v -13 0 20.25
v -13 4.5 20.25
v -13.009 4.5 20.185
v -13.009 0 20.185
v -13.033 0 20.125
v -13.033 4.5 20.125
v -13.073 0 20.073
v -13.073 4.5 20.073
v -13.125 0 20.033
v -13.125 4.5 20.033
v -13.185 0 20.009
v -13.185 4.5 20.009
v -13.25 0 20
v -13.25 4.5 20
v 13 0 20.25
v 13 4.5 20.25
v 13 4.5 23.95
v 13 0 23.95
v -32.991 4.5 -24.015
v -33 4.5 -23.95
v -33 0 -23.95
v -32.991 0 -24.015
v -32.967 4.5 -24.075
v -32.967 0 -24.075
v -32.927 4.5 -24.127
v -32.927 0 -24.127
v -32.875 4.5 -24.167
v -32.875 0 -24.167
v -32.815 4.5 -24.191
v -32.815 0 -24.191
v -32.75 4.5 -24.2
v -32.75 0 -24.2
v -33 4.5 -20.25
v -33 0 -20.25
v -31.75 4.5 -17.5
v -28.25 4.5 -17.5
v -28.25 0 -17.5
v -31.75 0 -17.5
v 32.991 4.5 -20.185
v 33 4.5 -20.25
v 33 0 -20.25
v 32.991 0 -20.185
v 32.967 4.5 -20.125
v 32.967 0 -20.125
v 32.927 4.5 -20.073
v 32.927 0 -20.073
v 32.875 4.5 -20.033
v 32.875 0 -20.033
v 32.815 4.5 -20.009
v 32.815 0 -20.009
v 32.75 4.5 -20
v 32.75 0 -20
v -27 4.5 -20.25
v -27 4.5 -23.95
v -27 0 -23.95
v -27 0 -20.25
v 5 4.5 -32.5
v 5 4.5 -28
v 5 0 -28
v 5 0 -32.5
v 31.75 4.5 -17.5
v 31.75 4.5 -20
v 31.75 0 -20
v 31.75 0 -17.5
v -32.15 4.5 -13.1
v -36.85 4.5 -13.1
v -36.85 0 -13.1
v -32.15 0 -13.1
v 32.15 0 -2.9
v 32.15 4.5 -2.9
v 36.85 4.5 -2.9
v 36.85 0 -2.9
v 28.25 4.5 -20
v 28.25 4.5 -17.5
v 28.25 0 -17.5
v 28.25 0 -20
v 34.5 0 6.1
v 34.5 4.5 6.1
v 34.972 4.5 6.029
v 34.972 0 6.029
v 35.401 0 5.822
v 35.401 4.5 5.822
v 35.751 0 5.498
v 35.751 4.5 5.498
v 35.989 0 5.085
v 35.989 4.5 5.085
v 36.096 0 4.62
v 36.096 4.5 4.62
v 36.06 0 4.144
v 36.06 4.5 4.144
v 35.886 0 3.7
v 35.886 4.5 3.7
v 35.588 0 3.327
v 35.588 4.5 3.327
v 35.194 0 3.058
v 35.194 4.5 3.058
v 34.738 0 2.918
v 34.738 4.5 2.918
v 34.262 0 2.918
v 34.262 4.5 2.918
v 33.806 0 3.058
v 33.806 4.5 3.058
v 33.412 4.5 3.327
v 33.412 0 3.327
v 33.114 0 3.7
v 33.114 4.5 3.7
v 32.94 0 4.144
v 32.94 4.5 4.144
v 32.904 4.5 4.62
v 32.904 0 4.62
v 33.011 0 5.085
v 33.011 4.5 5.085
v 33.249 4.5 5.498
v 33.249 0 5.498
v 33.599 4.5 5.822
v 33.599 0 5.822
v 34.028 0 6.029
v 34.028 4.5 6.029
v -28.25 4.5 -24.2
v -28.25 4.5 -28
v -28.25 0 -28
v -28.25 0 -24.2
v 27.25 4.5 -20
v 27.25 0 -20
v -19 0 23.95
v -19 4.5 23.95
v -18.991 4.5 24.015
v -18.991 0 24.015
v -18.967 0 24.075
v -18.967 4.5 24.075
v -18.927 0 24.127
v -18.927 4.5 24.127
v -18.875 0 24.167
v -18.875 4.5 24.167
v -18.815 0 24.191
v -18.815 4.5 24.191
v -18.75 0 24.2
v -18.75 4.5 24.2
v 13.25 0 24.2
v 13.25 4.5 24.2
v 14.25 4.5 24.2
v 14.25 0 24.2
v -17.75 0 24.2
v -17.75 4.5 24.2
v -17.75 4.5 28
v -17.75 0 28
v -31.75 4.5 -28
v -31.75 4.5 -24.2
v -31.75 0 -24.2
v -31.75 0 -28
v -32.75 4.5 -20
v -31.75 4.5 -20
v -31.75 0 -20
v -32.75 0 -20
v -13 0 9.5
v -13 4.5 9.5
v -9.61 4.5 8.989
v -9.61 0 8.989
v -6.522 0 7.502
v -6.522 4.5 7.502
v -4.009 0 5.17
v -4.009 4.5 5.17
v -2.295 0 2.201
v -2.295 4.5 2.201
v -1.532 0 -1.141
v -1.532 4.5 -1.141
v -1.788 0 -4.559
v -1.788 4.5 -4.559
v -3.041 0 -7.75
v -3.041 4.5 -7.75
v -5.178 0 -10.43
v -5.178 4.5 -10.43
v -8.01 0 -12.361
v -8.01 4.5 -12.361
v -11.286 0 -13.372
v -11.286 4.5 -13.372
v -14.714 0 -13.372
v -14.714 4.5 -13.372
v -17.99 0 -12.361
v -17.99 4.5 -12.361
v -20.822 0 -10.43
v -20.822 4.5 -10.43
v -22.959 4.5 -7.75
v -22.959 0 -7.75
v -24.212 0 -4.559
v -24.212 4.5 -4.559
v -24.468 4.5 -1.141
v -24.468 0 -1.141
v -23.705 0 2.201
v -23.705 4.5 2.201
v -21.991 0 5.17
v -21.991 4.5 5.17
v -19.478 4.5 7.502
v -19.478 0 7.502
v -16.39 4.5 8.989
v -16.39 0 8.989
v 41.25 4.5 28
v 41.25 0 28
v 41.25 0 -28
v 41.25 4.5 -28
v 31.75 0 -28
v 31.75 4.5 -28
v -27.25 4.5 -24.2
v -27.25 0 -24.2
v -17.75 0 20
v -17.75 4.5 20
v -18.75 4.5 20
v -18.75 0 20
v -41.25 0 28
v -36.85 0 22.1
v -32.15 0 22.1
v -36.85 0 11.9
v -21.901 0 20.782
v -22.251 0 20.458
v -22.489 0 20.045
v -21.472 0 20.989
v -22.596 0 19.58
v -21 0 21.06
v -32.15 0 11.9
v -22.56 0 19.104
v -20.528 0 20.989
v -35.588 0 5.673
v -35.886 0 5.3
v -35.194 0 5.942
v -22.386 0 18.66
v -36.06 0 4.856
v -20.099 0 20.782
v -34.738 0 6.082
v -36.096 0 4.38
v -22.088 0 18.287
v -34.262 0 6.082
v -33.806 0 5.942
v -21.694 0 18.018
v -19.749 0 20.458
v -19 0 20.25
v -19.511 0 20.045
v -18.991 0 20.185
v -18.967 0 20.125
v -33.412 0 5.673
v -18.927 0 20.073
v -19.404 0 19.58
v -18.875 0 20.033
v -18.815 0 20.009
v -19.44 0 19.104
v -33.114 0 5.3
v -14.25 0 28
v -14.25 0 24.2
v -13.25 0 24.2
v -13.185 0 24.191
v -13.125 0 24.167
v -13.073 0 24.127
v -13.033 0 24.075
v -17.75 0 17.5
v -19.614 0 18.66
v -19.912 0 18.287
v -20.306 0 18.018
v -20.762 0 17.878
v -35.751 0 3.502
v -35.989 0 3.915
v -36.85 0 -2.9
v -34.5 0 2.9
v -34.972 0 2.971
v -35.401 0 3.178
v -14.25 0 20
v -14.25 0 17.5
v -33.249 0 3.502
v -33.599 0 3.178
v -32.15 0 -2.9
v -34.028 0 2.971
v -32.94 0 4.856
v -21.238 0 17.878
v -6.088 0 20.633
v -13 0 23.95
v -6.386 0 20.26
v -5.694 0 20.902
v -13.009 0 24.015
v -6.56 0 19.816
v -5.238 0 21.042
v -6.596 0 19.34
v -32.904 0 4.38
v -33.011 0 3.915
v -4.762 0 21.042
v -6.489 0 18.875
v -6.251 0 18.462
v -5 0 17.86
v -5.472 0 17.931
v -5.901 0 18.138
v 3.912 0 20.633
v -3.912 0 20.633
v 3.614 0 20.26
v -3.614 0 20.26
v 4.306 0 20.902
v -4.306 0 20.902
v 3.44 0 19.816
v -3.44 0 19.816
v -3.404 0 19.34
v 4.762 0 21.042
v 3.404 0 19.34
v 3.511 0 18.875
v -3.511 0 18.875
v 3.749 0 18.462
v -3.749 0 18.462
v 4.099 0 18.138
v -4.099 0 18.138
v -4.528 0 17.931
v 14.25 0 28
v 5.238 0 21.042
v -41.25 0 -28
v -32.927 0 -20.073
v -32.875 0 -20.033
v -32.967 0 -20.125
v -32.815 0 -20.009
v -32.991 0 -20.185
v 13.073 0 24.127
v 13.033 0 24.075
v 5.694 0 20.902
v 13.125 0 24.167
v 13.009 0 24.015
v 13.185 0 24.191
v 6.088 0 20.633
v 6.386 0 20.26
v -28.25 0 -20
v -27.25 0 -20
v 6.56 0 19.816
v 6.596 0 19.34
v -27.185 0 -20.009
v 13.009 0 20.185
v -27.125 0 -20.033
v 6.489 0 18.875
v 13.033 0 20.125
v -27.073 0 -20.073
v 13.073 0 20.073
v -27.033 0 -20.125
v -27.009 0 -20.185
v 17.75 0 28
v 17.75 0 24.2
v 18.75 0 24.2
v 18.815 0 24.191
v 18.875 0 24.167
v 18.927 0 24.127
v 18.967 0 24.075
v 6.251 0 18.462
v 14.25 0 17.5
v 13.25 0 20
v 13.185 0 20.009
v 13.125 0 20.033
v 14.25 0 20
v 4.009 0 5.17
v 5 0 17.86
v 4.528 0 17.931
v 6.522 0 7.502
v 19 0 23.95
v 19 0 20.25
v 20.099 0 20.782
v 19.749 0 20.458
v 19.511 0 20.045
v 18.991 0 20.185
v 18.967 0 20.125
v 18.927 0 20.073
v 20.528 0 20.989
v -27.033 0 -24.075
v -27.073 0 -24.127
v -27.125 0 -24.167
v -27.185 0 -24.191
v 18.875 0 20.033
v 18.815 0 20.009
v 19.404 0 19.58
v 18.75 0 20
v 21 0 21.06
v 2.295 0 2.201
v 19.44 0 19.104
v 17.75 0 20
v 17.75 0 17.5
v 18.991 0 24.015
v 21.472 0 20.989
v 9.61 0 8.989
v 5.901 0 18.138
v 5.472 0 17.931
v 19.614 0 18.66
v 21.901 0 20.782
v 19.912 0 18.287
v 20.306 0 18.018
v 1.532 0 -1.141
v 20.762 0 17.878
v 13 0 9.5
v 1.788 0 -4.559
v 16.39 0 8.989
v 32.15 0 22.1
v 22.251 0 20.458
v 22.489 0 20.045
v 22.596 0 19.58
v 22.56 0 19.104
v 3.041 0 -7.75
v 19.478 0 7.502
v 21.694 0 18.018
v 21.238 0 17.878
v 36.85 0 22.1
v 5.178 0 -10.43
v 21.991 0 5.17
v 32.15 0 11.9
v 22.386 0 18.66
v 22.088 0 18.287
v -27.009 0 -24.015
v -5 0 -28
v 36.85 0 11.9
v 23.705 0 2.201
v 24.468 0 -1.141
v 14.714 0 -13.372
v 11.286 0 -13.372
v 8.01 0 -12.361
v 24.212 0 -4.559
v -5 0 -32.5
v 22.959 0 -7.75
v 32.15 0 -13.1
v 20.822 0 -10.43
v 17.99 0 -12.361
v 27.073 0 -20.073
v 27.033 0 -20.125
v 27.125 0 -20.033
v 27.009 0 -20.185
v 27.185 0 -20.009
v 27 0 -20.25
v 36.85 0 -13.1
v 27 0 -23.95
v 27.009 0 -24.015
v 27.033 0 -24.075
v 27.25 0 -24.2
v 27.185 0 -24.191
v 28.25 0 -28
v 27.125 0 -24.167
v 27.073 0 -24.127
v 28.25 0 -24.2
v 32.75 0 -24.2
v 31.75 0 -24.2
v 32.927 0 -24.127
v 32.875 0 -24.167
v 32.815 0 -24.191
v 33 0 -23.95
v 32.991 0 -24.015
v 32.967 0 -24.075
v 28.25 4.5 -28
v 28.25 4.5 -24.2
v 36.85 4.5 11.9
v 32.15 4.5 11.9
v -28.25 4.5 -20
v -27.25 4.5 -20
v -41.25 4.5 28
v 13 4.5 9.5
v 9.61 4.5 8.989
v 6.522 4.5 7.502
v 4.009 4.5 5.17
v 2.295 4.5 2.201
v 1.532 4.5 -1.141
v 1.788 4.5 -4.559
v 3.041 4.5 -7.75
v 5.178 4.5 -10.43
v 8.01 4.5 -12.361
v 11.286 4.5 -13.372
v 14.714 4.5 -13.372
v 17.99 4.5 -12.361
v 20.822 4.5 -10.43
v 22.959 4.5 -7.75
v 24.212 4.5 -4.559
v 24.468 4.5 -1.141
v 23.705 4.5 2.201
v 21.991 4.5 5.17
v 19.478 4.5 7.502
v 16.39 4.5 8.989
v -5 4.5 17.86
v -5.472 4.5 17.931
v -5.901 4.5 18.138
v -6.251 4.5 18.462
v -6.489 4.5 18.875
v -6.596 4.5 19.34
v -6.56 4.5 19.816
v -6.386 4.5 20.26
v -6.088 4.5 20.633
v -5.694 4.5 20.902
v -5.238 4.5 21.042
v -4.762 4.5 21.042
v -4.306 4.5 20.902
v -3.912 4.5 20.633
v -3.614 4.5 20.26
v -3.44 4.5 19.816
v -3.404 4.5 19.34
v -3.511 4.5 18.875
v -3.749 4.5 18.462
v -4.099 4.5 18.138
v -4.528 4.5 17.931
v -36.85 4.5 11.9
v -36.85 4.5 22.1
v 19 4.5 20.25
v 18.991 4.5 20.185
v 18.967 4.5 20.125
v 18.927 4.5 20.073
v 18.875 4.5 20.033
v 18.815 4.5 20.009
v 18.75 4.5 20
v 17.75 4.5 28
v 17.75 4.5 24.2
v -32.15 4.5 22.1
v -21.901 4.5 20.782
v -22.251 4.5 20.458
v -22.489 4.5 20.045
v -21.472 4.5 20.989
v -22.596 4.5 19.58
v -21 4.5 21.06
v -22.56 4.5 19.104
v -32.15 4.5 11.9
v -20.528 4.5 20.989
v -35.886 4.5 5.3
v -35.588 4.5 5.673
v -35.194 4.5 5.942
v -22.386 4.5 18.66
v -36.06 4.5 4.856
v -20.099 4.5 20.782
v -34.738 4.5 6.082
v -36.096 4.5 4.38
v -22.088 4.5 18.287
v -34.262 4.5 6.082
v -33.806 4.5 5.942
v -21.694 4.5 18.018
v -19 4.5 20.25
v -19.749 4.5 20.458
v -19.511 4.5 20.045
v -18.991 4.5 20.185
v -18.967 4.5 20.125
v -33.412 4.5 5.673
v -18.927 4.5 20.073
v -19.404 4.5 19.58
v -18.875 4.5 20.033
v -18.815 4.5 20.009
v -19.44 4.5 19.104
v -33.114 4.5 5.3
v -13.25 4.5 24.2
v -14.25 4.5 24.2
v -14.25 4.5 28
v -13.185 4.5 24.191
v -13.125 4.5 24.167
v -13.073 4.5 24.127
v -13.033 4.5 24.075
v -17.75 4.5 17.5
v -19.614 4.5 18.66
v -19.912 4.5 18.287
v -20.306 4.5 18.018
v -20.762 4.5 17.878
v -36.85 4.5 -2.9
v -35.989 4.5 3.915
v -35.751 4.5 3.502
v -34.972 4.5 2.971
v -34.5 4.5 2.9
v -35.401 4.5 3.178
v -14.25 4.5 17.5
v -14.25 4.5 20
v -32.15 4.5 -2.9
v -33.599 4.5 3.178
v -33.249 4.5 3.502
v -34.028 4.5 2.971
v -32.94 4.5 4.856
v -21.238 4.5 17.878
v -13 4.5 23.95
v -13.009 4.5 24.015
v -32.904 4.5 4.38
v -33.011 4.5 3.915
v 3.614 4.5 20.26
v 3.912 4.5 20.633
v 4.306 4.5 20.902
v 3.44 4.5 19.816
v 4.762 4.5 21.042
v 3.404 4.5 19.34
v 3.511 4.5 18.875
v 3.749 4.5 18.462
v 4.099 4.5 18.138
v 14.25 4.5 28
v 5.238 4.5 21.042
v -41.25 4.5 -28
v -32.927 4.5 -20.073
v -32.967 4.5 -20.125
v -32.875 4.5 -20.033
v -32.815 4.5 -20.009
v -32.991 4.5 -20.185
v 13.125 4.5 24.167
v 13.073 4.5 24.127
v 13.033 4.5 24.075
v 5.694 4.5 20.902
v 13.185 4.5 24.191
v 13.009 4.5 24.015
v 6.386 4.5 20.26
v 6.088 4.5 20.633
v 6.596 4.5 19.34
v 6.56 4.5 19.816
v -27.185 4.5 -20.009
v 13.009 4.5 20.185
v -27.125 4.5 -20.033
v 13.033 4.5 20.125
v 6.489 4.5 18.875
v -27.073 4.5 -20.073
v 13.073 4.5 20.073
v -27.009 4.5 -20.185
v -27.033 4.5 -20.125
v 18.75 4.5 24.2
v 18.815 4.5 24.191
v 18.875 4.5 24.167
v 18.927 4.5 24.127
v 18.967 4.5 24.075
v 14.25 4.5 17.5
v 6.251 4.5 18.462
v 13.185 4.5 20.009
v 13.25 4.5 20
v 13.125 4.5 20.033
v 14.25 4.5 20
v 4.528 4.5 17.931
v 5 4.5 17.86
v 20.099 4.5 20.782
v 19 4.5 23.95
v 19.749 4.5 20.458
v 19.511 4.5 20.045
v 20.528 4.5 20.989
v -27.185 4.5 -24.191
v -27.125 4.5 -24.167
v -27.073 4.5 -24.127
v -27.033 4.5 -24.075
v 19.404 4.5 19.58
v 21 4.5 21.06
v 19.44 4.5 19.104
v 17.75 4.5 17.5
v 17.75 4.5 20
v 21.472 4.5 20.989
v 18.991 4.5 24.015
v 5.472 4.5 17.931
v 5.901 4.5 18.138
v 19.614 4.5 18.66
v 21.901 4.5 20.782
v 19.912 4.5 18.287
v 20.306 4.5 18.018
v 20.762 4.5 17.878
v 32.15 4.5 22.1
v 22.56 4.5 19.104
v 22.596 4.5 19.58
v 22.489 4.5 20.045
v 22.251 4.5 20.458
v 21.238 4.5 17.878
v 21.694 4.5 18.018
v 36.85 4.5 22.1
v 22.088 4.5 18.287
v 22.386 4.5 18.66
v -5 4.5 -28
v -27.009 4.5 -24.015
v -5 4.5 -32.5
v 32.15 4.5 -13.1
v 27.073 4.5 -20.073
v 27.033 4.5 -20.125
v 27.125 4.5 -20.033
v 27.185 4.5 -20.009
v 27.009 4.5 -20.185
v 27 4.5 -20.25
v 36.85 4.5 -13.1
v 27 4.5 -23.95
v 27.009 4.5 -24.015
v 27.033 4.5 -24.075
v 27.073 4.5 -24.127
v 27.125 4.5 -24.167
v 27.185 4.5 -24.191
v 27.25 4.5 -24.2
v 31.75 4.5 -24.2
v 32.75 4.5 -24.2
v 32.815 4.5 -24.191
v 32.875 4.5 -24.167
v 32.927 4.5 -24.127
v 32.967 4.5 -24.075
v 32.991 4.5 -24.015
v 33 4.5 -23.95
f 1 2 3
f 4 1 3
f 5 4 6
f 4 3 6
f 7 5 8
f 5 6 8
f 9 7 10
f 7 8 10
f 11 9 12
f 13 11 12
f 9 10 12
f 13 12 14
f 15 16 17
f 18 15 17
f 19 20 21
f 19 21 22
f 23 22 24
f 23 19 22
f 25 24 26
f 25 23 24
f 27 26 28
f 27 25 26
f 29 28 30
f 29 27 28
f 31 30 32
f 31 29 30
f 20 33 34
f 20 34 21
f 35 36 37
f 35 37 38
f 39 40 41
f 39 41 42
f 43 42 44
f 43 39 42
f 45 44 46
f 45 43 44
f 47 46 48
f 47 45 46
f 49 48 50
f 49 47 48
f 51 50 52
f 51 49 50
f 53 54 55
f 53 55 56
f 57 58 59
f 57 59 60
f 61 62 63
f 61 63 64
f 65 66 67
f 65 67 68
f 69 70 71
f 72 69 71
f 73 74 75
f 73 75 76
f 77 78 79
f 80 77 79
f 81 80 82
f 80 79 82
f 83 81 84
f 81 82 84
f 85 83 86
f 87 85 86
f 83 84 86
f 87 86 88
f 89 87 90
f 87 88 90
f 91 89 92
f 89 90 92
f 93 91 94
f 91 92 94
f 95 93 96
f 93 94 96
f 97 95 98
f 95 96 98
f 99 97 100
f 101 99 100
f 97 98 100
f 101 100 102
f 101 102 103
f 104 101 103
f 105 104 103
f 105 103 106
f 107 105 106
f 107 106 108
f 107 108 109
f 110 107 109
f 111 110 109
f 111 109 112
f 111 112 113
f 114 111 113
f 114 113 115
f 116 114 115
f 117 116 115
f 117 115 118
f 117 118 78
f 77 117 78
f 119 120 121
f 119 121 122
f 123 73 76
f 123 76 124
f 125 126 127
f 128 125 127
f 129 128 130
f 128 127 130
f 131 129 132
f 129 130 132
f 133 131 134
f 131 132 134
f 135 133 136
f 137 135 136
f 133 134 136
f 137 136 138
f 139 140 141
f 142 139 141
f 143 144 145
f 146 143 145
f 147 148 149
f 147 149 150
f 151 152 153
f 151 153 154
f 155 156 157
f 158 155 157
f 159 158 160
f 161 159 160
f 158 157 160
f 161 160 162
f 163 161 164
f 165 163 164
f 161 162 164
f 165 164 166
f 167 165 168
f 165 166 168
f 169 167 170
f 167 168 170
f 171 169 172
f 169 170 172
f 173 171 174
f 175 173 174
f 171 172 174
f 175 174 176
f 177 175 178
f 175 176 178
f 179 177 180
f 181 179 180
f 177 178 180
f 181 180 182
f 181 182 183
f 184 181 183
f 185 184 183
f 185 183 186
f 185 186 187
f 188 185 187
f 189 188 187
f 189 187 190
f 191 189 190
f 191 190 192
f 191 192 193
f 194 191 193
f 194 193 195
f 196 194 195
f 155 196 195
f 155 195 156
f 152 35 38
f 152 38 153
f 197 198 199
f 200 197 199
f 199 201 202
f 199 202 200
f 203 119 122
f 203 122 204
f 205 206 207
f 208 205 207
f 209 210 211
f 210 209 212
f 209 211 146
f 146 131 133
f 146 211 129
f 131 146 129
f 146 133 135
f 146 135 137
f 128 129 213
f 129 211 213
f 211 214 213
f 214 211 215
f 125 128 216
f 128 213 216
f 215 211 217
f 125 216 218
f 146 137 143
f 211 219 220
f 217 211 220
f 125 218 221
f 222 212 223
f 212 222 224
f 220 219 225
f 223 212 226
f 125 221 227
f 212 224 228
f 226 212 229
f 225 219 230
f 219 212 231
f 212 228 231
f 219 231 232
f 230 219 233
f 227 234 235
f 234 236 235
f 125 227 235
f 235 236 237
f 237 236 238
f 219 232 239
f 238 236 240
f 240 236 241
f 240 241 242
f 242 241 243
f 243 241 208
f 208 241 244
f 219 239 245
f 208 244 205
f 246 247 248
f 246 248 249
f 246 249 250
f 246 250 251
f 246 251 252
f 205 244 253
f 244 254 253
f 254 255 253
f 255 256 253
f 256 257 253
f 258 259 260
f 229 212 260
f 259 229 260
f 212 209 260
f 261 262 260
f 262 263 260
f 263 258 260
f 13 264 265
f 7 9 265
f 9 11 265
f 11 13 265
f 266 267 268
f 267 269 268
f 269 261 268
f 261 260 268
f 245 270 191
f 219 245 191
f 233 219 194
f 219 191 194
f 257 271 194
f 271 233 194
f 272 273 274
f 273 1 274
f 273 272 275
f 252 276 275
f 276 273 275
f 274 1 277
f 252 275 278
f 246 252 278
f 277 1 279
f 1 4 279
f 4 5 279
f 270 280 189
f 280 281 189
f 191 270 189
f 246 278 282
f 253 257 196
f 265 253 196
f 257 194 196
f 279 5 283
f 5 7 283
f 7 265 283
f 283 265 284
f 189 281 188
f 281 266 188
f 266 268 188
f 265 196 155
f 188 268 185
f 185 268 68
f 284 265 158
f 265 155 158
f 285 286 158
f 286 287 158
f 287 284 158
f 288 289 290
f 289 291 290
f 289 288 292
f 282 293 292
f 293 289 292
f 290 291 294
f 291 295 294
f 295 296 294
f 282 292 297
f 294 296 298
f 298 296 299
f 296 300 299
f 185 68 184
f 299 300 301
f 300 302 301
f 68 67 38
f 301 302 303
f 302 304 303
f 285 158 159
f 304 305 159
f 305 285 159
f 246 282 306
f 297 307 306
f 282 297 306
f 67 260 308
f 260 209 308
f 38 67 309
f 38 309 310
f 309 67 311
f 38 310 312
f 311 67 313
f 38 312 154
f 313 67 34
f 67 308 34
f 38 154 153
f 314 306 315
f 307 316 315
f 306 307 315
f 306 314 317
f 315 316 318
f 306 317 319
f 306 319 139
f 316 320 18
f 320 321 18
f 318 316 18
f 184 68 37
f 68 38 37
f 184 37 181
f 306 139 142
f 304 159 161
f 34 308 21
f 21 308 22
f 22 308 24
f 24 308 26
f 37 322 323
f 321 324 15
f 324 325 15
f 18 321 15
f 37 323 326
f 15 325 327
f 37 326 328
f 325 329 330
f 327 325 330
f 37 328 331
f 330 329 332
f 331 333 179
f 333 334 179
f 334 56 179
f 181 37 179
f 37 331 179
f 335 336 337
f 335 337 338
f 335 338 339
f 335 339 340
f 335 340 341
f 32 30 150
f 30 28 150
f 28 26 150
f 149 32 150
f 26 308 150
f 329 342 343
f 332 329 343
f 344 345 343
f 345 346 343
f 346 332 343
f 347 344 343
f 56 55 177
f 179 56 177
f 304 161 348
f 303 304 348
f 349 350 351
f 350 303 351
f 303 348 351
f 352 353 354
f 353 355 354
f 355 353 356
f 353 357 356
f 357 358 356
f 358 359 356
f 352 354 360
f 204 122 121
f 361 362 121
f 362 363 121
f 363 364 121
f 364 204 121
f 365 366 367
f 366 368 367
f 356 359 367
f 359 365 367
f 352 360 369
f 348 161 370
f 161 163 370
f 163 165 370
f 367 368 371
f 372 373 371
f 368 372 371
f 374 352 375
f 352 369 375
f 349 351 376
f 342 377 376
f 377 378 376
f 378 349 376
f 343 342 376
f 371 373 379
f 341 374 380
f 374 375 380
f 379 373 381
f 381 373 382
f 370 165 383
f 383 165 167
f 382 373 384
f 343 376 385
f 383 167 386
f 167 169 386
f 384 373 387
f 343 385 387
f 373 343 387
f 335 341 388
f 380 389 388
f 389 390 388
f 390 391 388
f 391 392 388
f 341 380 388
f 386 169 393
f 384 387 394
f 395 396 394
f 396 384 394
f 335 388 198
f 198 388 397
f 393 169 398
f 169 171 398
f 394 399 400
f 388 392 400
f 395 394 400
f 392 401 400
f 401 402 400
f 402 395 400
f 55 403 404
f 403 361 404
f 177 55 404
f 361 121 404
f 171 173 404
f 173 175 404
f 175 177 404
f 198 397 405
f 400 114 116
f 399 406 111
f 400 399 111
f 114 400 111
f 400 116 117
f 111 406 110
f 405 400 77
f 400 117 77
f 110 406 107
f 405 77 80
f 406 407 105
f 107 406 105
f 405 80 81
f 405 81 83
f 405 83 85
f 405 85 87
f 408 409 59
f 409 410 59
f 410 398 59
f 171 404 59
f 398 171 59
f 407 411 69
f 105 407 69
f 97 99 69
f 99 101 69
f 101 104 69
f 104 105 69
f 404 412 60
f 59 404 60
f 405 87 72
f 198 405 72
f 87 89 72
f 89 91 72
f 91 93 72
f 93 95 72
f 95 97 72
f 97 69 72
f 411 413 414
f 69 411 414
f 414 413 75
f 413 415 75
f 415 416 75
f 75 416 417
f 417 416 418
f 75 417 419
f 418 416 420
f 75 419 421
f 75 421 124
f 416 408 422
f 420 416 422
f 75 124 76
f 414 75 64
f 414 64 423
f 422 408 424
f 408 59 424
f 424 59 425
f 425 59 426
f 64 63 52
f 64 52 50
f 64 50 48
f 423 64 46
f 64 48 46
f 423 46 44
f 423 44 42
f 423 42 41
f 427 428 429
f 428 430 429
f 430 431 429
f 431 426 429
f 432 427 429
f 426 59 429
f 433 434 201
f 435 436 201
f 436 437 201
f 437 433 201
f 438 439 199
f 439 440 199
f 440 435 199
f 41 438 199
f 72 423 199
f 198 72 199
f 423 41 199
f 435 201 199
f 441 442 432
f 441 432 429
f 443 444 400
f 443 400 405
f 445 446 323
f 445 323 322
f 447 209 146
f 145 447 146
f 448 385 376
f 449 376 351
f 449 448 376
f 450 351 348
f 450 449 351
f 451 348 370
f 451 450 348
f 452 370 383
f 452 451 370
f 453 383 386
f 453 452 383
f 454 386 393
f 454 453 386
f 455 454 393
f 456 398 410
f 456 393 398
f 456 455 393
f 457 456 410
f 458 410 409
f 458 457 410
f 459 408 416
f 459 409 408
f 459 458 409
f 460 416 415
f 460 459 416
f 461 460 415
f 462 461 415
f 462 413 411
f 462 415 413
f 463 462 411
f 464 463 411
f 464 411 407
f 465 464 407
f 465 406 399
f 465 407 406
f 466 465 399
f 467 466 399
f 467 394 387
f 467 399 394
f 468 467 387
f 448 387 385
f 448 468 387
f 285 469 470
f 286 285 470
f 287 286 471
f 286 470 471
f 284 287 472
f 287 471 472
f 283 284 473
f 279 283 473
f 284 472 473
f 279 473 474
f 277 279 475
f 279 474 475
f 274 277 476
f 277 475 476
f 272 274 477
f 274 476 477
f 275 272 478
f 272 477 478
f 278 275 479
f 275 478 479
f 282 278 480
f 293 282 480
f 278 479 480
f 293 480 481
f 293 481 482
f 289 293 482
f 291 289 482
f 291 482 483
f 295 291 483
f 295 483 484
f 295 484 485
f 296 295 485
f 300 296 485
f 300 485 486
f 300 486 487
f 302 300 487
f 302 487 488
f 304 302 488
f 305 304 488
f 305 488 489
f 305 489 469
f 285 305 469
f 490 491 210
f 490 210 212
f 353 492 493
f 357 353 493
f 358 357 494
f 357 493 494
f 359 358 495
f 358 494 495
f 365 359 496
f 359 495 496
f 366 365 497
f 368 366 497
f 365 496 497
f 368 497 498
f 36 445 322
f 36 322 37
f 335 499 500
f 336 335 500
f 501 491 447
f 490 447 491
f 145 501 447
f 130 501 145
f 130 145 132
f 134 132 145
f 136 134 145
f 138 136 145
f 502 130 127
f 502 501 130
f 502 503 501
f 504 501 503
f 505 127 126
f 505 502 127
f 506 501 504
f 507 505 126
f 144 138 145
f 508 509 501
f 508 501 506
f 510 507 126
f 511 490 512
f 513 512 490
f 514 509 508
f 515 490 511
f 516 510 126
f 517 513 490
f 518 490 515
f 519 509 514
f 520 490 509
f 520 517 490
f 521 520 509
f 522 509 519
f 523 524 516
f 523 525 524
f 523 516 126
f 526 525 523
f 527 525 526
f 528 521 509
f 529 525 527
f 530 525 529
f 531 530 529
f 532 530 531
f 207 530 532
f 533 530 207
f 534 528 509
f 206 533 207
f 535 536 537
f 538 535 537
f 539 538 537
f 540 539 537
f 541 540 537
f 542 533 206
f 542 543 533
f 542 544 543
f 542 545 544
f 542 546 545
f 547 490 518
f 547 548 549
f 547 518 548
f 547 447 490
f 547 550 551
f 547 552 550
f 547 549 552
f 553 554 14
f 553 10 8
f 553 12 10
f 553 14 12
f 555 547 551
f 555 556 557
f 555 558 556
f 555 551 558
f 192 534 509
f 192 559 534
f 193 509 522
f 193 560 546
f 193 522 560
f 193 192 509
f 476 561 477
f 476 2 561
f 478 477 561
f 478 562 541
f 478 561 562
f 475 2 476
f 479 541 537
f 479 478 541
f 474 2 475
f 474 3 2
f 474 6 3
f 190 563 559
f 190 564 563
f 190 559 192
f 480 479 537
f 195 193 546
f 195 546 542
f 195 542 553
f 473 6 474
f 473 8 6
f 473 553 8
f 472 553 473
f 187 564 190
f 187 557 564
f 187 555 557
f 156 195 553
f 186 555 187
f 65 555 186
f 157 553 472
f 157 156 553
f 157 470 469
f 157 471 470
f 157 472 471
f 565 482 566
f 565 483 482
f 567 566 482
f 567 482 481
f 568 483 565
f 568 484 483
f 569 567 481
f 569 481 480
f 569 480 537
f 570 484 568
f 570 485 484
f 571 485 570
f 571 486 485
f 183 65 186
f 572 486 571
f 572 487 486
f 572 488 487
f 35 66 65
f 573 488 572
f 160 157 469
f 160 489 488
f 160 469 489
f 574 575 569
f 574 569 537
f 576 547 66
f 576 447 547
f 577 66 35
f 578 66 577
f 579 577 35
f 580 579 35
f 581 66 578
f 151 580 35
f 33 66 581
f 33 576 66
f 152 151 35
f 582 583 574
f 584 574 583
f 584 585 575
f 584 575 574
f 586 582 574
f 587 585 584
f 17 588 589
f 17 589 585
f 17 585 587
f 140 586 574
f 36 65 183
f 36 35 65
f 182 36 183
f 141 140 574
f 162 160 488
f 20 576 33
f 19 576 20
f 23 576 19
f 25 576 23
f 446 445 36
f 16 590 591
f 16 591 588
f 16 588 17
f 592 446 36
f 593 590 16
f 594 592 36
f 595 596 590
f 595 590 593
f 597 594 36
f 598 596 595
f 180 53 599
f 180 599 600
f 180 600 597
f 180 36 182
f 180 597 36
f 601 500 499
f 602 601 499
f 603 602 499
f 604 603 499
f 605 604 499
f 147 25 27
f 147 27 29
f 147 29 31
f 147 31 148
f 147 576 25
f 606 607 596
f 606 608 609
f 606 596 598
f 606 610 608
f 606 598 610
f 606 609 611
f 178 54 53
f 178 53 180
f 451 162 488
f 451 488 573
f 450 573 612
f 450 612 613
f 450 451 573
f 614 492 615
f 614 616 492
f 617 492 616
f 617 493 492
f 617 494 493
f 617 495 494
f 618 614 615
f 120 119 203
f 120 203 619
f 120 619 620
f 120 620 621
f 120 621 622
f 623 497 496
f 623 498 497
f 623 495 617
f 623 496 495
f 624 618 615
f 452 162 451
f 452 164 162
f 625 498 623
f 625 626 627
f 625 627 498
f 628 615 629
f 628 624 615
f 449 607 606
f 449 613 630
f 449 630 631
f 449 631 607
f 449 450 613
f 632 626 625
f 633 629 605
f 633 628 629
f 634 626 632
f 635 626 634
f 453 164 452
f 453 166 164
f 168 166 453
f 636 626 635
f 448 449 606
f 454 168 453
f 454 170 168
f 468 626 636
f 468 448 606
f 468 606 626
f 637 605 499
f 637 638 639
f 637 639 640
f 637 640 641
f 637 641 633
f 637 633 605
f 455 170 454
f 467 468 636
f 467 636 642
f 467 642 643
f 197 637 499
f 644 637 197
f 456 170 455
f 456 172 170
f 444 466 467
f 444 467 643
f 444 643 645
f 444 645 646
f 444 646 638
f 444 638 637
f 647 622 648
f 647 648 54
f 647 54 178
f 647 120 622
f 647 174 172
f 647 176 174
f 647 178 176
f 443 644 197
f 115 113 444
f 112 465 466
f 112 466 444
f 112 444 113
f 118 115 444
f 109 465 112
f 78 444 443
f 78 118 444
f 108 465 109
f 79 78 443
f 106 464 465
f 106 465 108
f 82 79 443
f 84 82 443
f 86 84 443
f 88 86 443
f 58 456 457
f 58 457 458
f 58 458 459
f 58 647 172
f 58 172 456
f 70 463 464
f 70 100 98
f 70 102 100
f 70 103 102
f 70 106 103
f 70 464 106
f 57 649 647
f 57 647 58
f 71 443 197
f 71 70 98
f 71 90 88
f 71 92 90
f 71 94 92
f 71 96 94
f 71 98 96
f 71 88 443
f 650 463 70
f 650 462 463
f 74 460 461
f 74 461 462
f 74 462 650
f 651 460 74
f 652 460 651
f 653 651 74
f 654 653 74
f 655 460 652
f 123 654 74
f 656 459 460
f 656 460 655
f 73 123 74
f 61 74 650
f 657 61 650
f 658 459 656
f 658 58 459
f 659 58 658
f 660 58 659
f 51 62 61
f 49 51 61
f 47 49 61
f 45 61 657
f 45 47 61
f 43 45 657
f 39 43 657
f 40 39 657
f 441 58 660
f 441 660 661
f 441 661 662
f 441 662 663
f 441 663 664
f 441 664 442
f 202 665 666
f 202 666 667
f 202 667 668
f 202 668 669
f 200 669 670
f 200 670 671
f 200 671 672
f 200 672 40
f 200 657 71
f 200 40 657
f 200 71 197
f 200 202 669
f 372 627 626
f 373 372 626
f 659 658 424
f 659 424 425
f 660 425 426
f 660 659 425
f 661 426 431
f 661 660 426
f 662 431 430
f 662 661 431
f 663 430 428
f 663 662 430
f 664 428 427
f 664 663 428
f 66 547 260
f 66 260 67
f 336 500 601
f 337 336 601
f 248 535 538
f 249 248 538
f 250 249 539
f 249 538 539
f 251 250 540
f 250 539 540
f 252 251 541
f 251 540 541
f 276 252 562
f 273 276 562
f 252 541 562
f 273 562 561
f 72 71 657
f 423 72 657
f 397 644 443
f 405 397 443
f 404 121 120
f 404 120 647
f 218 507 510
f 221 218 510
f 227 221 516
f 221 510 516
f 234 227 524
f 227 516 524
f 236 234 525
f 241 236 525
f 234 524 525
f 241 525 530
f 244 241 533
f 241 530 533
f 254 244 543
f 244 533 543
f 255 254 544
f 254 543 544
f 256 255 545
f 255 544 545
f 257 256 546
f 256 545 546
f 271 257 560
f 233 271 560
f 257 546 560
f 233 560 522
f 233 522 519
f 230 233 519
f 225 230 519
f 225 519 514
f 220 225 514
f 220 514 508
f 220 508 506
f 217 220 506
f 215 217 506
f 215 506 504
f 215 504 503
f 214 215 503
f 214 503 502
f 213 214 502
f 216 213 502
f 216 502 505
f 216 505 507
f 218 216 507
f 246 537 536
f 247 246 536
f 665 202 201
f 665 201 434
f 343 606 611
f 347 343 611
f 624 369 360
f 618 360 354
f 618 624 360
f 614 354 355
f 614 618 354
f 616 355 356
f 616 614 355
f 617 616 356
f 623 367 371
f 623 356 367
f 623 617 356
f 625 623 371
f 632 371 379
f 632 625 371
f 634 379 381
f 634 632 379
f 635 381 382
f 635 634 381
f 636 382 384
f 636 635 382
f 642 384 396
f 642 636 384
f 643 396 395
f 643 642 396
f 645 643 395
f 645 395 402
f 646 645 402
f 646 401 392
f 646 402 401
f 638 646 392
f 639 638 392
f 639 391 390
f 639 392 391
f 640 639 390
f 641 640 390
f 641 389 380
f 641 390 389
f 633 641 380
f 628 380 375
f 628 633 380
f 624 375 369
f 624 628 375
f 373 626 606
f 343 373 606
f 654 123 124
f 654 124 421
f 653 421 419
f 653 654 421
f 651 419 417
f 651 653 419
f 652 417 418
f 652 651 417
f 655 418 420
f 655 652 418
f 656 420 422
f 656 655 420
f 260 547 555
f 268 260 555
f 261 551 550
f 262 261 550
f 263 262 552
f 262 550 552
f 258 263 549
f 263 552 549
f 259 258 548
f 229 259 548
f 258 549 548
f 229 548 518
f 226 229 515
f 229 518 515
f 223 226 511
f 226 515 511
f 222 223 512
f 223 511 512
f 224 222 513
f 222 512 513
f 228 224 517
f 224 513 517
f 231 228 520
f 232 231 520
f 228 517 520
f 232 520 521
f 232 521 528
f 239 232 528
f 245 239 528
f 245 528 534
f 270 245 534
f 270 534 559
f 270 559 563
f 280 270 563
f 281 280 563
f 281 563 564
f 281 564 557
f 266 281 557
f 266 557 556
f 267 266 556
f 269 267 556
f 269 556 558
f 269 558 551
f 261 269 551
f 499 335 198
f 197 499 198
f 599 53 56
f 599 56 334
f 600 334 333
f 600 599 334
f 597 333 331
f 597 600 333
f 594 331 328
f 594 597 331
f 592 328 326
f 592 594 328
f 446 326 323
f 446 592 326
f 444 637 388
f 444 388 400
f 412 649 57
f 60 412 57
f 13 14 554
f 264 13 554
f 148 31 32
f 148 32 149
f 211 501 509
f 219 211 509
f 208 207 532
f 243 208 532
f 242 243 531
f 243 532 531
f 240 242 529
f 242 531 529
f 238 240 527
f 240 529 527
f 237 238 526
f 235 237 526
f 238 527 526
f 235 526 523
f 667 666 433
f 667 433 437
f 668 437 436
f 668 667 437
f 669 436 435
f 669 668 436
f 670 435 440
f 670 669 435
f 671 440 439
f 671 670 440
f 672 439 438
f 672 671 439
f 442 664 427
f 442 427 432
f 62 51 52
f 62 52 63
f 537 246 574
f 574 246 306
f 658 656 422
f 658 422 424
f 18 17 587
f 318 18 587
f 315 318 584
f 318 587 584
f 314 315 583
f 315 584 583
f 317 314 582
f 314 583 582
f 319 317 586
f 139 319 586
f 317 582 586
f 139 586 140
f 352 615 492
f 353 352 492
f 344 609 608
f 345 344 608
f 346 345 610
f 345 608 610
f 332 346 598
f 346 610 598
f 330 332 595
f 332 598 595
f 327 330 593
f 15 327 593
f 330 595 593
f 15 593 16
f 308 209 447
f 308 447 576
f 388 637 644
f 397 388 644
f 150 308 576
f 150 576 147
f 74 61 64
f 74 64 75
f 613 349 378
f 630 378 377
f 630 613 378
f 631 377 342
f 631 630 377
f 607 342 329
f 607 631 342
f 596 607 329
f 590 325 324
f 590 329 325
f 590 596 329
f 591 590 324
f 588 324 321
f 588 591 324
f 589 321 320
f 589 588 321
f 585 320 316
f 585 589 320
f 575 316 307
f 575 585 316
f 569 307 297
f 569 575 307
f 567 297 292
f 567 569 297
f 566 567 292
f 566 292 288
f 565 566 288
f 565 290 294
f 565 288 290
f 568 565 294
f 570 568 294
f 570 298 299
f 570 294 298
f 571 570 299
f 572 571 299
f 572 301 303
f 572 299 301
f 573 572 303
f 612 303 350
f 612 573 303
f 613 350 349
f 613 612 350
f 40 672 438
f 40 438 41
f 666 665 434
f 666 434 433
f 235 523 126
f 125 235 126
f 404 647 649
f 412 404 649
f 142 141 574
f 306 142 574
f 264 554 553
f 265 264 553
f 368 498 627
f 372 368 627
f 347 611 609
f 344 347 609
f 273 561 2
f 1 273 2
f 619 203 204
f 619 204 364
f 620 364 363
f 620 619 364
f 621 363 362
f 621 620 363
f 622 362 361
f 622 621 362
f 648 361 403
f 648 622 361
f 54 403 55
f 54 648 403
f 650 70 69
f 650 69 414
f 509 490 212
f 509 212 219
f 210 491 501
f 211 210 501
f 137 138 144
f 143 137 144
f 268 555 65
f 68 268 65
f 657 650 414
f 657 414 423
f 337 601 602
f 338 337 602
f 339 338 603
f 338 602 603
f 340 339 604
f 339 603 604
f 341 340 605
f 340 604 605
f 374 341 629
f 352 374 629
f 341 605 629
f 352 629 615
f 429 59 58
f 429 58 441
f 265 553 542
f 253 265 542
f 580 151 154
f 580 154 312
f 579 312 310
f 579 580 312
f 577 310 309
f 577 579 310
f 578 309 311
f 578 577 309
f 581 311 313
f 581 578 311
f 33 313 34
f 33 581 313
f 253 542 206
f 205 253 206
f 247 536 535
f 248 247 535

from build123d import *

# Parameters (mm, degrees)
SKETCH1_W          = 82.5
SKETCH1_H          = 56
MAINSHAPE_DEPTH    = 4.5
SKETCH2_W          = 10
SKETCH2_H          = 9
TAB1_DEPTH         = 4.5
CUT_EXTRUDE2_DEPTH = 53.707328712
SKETCH5_R          = 1.6
SKETCH5_W          = 4.7
SKETCH5_H          = 10.2
CUT_EXTRUDE3_DEPTH = 53.707328712
SKETCH6_R          = 11.5
CUT_EXTRUDE4_DEPTH = 53.707328712
SKETCH8_R          = 1.6
CUT_EXTRUDE6_DEPTH = 53.707328712
CUT_EXTRUDE7_DEPTH = 53.707328712


with BuildPart() as part:
    # Sketch1 → MainShape (new body)
    with BuildSketch(Plane(origin=(0, 0, 0), x_dir=(1, 0, 0), z_dir=(0, 1, 0))):
        Rectangle(SKETCH1_W, SKETCH1_H)
    extrude(amount=MAINSHAPE_DEPTH)

    # Sketch2 → Tab1 (add, through all)
    with BuildSketch(Plane(origin=(0, 4.5, 0), x_dir=(1, 0, 0), z_dir=(0, 1, 0))):
        with Locations((0, 28)):
            Rectangle(SKETCH2_W, SKETCH2_H)
    extrude(amount=-TAB1_DEPTH)

    # Sketch4 → Cut-Extrude2 (cut, through all)
    with BuildSketch(Plane(origin=(0, 4.5, 0), x_dir=(1, 0, 0), z_dir=(0, 1, 0))):
        with BuildLine():
            Line((-28.25, 17.5), (-31.75, 17.5))
            Line((-31.75, 17.5), (-31.75, 20))
            Line((-31.75, 20), (-32.75, 20))
            ThreePointArc((-32.75, 20), (-32.926776695, 20.073223305), (-33, 20.25))
            Line((-33, 20.25), (-33, 23.95))
            ThreePointArc((-33, 23.95), (-32.926776695, 24.126776695), (-32.75, 24.2))
            Line((-32.75, 24.2), (-31.75, 24.2))
            Line((-31.75, 24.2), (-31.75, 28))
            Line((-31.75, 28), (-28.25, 28))
            Line((-28.25, 28), (-28.25, 24.2))
            Line((-28.25, 24.2), (-27.25, 24.2))
            ThreePointArc((-27.25, 24.2), (-27.073223305, 24.126776695), (-27, 23.95))
            Line((-27, 23.95), (-27, 20.25))
            ThreePointArc((-27, 20.25), (-27.073223305, 20.073223305), (-27.25, 20))
            Line((-27.25, 20), (-28.25, 20))
            Line((-28.25, 20), (-28.25, 17.5))
        make_face()
        with BuildLine():
            Line((28.25, 17.5), (28.25, 20))
            Line((28.25, 20), (27.25, 20))
            ThreePointArc((27.25, 20), (27.073223305, 20.073223305), (27, 20.25))
            Line((27, 20.25), (27, 23.95))
            ThreePointArc((27, 23.95), (27.073223305, 24.126776695), (27.25, 24.2))
            Line((27.25, 24.2), (28.25, 24.2))
            Line((28.25, 24.2), (28.25, 28))
            Line((28.25, 28), (31.75, 28))
            Line((31.75, 28), (31.75, 24.2))
            Line((31.75, 24.2), (32.75, 24.2))
            ThreePointArc((32.75, 24.2), (32.926776695, 24.126776695), (33, 23.95))
            Line((33, 23.95), (33, 20.25))
            ThreePointArc((33, 20.25), (32.926776695, 20.073223305), (32.75, 20))
            Line((32.75, 20), (31.75, 20))
            Line((31.75, 20), (31.75, 17.5))
            Line((31.75, 17.5), (28.25, 17.5))
        make_face()
    extrude(amount=-CUT_EXTRUDE2_DEPTH, mode=Mode.SUBTRACT)

    # Sketch5 → Cut-Extrude3 (cut, through all)
    with BuildSketch(Plane(origin=(0, 4.5, 0), x_dir=(1, 0, 0), z_dir=(0, 1, 0))):
        with Locations(Location((34.5, -4.5, 0), (0, 0, 270))):
            Circle(SKETCH5_R)
        with Locations(Location((-34.5, -4.5, 0), (0, 0, 90))):
            Circle(SKETCH5_R)
        with Locations((34.5, 8)):
            Rectangle(SKETCH5_W, SKETCH5_H)
        with Locations((-34.5, 8)):
            Rectangle(SKETCH5_W, SKETCH5_H)
        with Locations((-34.5, -17)):
            Rectangle(SKETCH5_W, SKETCH5_H)
        with Locations((34.5, -17)):
            Rectangle(SKETCH5_W, SKETCH5_H)
    extrude(amount=-CUT_EXTRUDE3_DEPTH, mode=Mode.SUBTRACT)

    # Sketch6 → Cut-Extrude4 (cut, through all)
    with BuildSketch(Plane(origin=(0, 4.5, 0), x_dir=(1, 0, 0), z_dir=(0, 1, 0))):
        with Locations(Location((-13, 2, 0), (0, 0, 270))):
            Circle(SKETCH6_R)
    cut_extrude4 = extrude(amount=-CUT_EXTRUDE4_DEPTH, mode=Mode.SUBTRACT)

    # Sketch8 → Cut-Extrude6 (cut, through all)
    with BuildSketch(Plane(origin=(0, 4.5, 0), x_dir=(1, 0, 0), z_dir=(0, 1, 0))):
        with Locations(Location((-21, -19.46, 0), (0, 0, 270))):
            Circle(SKETCH8_R)
        with Locations(Location((-5, -19.46, 0), (0, 0, 90))):
            Circle(SKETCH8_R)
    cut_extrude6 = extrude(amount=-CUT_EXTRUDE6_DEPTH, mode=Mode.SUBTRACT)

    # Sketch9 → Cut-Extrude7 (cut, through all)
    with BuildSketch(Plane(origin=(0, 4.5, 0), x_dir=(1, 0, 0), z_dir=(0, 1, 0))):
        with BuildLine():
            Line((17.75, -28), (17.75, -24.2))
            Line((17.75, -24.2), (18.75, -24.2))
            ThreePointArc((18.75, -24.2), (18.926776695, -24.126776695), (19, -23.95))
            Line((19, -23.95), (19, -20.25))
            ThreePointArc((19, -20.25), (18.926776695, -20.073223305), (18.75, -20))
            Line((18.75, -20), (17.75, -20))
            Line((17.75, -20), (17.75, -17.5))
            Line((17.75, -17.5), (14.25, -17.5))
            Line((14.25, -17.5), (14.25, -20))
            Line((14.25, -20), (13.25, -20))
            ThreePointArc((13.25, -20), (13.073223305, -20.073223305), (13, -20.25))
            Line((13, -20.25), (13, -23.95))
            ThreePointArc((13, -23.95), (13.073223305, -24.126776695), (13.25, -24.2))
            Line((13.25, -24.2), (14.25, -24.2))
            Line((14.25, -24.2), (14.25, -28))
            Line((14.25, -28), (17.75, -28))
        make_face()
        with BuildLine():
            Line((-14.25, -28), (-14.25, -24.2))
            Line((-14.25, -24.2), (-13.25, -24.2))
            ThreePointArc((-13.25, -24.2), (-13.073223305, -24.126776695), (-13, -23.95))
            Line((-13, -23.95), (-13, -20.25))
            ThreePointArc((-13, -20.25), (-13.073223305, -20.073223305), (-13.25, -20))
            Line((-13.25, -20), (-14.25, -20))
            Line((-14.25, -20), (-14.25, -17.5))
            Line((-14.25, -17.5), (-17.75, -17.5))
            Line((-17.75, -17.5), (-17.75, -20))
            Line((-17.75, -20), (-18.75, -20))
            ThreePointArc((-18.75, -20), (-18.926776695, -20.073223305), (-19, -20.25))
            Line((-19, -20.25), (-19, -23.95))
            ThreePointArc((-19, -23.95), (-18.926776695, -24.126776695), (-18.75, -24.2))
            Line((-18.75, -24.2), (-17.75, -24.2))
            Line((-17.75, -24.2), (-17.75, -28))
            Line((-17.75, -28), (-14.25, -28))
        make_face()
    extrude(amount=-CUT_EXTRUDE7_DEPTH, mode=Mode.SUBTRACT)

    # Mirror1: Cut-Extrude4, Cut-Extrude6 across plane
    add(cut_extrude4.mirror(Plane(origin=(0, 0, 0), x_dir=(0, 0, 1), z_dir=(1, 0, 0))), mode=Mode.SUBTRACT)
    add(cut_extrude6.mirror(Plane(origin=(0, 0, 0), x_dir=(0, 0, 1), z_dir=(1, 0, 0))), mode=Mode.SUBTRACT)


solid = part.part
